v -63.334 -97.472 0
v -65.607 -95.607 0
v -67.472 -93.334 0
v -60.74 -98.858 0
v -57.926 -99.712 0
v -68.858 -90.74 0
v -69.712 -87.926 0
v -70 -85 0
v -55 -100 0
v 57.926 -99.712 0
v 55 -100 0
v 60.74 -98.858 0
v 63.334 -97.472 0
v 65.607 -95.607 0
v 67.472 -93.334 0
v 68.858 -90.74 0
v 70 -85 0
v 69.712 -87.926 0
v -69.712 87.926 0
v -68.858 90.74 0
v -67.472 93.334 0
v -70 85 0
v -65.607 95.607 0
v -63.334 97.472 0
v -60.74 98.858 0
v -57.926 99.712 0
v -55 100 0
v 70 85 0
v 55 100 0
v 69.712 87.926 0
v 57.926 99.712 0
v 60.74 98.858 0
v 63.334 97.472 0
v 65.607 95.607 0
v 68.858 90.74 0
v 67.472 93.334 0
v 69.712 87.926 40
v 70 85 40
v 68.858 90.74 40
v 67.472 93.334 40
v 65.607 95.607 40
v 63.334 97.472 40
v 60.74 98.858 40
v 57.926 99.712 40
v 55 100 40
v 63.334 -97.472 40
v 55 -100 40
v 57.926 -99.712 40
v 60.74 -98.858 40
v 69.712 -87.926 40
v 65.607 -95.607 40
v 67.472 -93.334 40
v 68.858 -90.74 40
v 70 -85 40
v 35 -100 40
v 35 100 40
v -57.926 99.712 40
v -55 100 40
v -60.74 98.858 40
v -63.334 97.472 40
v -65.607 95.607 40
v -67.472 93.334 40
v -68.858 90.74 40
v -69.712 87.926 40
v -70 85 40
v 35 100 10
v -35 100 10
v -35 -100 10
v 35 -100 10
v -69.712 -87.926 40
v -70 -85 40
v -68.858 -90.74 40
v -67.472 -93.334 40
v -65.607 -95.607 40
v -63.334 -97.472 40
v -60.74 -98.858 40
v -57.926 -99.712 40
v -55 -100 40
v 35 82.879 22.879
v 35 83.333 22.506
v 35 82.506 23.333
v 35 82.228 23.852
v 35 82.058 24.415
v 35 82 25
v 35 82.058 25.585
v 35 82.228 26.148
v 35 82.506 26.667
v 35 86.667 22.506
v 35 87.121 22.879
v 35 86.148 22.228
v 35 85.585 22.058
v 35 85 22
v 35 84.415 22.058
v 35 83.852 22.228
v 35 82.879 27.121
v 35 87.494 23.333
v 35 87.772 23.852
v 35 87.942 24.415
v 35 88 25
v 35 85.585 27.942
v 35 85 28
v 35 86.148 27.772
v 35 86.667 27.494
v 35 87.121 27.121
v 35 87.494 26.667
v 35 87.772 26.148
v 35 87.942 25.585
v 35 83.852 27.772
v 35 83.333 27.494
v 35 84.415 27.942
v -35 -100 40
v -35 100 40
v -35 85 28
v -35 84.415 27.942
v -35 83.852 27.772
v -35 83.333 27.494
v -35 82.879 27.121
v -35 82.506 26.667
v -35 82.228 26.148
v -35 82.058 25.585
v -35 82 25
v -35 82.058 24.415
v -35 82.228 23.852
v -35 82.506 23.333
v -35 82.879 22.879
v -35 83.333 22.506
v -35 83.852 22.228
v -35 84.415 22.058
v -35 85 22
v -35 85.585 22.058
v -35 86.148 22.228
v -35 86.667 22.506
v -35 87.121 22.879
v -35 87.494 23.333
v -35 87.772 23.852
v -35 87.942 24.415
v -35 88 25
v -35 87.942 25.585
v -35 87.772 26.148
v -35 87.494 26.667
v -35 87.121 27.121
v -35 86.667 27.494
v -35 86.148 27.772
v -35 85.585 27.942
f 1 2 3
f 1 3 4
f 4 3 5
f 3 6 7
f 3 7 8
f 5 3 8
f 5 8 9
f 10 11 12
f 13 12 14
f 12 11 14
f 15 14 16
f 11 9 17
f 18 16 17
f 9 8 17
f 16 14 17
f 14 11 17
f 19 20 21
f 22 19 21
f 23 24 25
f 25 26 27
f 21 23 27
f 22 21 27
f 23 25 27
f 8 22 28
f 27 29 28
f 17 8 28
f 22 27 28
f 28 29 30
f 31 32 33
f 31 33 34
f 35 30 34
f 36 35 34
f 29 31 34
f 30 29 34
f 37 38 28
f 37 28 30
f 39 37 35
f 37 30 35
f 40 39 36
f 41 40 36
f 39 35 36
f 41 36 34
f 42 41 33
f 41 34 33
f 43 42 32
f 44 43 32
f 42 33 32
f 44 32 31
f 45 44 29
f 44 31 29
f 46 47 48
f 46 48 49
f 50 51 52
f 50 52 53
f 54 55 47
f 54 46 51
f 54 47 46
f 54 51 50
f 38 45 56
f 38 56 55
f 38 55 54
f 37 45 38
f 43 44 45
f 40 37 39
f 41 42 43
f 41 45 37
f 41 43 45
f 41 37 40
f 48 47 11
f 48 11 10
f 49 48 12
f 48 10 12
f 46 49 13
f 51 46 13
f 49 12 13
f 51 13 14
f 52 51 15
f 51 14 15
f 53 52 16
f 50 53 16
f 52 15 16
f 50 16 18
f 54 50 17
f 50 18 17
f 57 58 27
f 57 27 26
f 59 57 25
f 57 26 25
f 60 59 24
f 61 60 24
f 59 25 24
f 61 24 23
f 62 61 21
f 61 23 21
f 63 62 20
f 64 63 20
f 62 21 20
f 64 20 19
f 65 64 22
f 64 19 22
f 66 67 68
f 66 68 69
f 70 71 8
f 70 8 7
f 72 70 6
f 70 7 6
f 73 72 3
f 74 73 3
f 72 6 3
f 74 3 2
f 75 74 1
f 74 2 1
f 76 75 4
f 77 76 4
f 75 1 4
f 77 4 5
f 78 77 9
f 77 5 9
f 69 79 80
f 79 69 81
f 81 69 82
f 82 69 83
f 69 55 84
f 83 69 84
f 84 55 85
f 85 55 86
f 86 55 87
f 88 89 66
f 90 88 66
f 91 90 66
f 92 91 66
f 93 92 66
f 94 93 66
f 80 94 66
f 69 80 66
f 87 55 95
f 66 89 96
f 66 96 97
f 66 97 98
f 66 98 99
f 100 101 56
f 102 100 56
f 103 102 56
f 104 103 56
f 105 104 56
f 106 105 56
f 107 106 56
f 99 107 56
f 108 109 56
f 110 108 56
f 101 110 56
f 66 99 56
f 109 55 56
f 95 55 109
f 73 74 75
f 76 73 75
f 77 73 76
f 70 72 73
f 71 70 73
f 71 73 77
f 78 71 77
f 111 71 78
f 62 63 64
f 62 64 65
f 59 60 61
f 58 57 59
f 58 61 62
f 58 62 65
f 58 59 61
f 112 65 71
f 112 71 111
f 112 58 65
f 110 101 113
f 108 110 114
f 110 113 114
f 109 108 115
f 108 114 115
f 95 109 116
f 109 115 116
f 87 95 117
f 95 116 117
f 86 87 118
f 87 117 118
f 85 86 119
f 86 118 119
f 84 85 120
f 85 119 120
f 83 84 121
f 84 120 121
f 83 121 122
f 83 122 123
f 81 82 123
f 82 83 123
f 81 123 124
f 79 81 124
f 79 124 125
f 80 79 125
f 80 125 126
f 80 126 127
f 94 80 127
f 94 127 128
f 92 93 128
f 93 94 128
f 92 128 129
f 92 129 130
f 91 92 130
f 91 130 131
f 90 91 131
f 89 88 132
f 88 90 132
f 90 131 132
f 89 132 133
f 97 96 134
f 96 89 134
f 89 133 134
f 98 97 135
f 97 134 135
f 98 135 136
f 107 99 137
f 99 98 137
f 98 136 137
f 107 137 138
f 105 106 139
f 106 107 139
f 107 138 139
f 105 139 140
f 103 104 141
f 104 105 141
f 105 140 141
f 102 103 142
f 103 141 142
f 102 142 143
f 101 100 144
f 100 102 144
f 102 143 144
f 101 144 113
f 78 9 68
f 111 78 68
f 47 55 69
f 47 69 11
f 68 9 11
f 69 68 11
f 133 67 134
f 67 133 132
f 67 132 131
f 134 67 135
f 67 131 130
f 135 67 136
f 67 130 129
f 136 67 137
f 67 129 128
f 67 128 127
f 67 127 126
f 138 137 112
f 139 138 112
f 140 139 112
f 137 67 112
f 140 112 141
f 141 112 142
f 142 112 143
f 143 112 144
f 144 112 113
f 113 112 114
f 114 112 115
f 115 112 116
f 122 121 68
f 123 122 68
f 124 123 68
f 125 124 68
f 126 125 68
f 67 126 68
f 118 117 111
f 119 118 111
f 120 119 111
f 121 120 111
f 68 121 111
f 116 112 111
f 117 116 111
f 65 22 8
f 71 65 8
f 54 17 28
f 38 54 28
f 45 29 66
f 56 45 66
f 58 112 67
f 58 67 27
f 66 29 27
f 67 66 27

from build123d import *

# Parameters (mm, degrees)
EXTRUDE_1_DEPTH     = 40
CUT_EXTRUDE_1_DEPTH = 30
SKETCH_4_R          = 3
EXTRUDE_2_DEPTH     = 83.650089496


with BuildPart() as part:
    # 草图2 → 凸台-拉伸1 (new body)
    with BuildSketch(Plane.XY):
        with BuildLine():
            Line((0, 100), (-55, 100))
            ThreePointArc((-55, 100), (-65.606601718, 95.606601718), (-70, 85))
            Line((-70, 85), (-70, -85))
            ThreePointArc((-70, -85), (-65.606601718, -95.606601718), (-55, -100))
            Line((-55, -100), (55, -100))
            ThreePointArc((55, -100), (65.606601718, -95.606601718), (70, -85))
            Line((70, -85), (70, 85))
            ThreePointArc((70, 85), (65.606601718, 95.606601718), (55, 100))
            Line((55, 100), (0, 100))
        make_face()
    extrude(amount=EXTRUDE_1_DEPTH)

    # 草图3 → 切除-拉伸1 (cut)
    with BuildSketch(Plane.XY.offset(40)):
        Polygon((0, 100), (-35, 100), (-35, -100), (35, -100), (35, 100), align=None)
    extrude(amount=-CUT_EXTRUDE_1_DEPTH, mode=Mode.SUBTRACT)

    # 草图4 → 凸台-拉伸2 (add)
    with BuildSketch(Plane(origin=(-35, 0, 0), x_dir=(0, 0, -1), z_dir=(1, 0, 0))):
        with Locations(Location((-25, 85, 0), (0, 0, 180))):
            Circle(SKETCH_4_R)
    extrude(amount=EXTRUDE_2_DEPTH)


solid = part.part
